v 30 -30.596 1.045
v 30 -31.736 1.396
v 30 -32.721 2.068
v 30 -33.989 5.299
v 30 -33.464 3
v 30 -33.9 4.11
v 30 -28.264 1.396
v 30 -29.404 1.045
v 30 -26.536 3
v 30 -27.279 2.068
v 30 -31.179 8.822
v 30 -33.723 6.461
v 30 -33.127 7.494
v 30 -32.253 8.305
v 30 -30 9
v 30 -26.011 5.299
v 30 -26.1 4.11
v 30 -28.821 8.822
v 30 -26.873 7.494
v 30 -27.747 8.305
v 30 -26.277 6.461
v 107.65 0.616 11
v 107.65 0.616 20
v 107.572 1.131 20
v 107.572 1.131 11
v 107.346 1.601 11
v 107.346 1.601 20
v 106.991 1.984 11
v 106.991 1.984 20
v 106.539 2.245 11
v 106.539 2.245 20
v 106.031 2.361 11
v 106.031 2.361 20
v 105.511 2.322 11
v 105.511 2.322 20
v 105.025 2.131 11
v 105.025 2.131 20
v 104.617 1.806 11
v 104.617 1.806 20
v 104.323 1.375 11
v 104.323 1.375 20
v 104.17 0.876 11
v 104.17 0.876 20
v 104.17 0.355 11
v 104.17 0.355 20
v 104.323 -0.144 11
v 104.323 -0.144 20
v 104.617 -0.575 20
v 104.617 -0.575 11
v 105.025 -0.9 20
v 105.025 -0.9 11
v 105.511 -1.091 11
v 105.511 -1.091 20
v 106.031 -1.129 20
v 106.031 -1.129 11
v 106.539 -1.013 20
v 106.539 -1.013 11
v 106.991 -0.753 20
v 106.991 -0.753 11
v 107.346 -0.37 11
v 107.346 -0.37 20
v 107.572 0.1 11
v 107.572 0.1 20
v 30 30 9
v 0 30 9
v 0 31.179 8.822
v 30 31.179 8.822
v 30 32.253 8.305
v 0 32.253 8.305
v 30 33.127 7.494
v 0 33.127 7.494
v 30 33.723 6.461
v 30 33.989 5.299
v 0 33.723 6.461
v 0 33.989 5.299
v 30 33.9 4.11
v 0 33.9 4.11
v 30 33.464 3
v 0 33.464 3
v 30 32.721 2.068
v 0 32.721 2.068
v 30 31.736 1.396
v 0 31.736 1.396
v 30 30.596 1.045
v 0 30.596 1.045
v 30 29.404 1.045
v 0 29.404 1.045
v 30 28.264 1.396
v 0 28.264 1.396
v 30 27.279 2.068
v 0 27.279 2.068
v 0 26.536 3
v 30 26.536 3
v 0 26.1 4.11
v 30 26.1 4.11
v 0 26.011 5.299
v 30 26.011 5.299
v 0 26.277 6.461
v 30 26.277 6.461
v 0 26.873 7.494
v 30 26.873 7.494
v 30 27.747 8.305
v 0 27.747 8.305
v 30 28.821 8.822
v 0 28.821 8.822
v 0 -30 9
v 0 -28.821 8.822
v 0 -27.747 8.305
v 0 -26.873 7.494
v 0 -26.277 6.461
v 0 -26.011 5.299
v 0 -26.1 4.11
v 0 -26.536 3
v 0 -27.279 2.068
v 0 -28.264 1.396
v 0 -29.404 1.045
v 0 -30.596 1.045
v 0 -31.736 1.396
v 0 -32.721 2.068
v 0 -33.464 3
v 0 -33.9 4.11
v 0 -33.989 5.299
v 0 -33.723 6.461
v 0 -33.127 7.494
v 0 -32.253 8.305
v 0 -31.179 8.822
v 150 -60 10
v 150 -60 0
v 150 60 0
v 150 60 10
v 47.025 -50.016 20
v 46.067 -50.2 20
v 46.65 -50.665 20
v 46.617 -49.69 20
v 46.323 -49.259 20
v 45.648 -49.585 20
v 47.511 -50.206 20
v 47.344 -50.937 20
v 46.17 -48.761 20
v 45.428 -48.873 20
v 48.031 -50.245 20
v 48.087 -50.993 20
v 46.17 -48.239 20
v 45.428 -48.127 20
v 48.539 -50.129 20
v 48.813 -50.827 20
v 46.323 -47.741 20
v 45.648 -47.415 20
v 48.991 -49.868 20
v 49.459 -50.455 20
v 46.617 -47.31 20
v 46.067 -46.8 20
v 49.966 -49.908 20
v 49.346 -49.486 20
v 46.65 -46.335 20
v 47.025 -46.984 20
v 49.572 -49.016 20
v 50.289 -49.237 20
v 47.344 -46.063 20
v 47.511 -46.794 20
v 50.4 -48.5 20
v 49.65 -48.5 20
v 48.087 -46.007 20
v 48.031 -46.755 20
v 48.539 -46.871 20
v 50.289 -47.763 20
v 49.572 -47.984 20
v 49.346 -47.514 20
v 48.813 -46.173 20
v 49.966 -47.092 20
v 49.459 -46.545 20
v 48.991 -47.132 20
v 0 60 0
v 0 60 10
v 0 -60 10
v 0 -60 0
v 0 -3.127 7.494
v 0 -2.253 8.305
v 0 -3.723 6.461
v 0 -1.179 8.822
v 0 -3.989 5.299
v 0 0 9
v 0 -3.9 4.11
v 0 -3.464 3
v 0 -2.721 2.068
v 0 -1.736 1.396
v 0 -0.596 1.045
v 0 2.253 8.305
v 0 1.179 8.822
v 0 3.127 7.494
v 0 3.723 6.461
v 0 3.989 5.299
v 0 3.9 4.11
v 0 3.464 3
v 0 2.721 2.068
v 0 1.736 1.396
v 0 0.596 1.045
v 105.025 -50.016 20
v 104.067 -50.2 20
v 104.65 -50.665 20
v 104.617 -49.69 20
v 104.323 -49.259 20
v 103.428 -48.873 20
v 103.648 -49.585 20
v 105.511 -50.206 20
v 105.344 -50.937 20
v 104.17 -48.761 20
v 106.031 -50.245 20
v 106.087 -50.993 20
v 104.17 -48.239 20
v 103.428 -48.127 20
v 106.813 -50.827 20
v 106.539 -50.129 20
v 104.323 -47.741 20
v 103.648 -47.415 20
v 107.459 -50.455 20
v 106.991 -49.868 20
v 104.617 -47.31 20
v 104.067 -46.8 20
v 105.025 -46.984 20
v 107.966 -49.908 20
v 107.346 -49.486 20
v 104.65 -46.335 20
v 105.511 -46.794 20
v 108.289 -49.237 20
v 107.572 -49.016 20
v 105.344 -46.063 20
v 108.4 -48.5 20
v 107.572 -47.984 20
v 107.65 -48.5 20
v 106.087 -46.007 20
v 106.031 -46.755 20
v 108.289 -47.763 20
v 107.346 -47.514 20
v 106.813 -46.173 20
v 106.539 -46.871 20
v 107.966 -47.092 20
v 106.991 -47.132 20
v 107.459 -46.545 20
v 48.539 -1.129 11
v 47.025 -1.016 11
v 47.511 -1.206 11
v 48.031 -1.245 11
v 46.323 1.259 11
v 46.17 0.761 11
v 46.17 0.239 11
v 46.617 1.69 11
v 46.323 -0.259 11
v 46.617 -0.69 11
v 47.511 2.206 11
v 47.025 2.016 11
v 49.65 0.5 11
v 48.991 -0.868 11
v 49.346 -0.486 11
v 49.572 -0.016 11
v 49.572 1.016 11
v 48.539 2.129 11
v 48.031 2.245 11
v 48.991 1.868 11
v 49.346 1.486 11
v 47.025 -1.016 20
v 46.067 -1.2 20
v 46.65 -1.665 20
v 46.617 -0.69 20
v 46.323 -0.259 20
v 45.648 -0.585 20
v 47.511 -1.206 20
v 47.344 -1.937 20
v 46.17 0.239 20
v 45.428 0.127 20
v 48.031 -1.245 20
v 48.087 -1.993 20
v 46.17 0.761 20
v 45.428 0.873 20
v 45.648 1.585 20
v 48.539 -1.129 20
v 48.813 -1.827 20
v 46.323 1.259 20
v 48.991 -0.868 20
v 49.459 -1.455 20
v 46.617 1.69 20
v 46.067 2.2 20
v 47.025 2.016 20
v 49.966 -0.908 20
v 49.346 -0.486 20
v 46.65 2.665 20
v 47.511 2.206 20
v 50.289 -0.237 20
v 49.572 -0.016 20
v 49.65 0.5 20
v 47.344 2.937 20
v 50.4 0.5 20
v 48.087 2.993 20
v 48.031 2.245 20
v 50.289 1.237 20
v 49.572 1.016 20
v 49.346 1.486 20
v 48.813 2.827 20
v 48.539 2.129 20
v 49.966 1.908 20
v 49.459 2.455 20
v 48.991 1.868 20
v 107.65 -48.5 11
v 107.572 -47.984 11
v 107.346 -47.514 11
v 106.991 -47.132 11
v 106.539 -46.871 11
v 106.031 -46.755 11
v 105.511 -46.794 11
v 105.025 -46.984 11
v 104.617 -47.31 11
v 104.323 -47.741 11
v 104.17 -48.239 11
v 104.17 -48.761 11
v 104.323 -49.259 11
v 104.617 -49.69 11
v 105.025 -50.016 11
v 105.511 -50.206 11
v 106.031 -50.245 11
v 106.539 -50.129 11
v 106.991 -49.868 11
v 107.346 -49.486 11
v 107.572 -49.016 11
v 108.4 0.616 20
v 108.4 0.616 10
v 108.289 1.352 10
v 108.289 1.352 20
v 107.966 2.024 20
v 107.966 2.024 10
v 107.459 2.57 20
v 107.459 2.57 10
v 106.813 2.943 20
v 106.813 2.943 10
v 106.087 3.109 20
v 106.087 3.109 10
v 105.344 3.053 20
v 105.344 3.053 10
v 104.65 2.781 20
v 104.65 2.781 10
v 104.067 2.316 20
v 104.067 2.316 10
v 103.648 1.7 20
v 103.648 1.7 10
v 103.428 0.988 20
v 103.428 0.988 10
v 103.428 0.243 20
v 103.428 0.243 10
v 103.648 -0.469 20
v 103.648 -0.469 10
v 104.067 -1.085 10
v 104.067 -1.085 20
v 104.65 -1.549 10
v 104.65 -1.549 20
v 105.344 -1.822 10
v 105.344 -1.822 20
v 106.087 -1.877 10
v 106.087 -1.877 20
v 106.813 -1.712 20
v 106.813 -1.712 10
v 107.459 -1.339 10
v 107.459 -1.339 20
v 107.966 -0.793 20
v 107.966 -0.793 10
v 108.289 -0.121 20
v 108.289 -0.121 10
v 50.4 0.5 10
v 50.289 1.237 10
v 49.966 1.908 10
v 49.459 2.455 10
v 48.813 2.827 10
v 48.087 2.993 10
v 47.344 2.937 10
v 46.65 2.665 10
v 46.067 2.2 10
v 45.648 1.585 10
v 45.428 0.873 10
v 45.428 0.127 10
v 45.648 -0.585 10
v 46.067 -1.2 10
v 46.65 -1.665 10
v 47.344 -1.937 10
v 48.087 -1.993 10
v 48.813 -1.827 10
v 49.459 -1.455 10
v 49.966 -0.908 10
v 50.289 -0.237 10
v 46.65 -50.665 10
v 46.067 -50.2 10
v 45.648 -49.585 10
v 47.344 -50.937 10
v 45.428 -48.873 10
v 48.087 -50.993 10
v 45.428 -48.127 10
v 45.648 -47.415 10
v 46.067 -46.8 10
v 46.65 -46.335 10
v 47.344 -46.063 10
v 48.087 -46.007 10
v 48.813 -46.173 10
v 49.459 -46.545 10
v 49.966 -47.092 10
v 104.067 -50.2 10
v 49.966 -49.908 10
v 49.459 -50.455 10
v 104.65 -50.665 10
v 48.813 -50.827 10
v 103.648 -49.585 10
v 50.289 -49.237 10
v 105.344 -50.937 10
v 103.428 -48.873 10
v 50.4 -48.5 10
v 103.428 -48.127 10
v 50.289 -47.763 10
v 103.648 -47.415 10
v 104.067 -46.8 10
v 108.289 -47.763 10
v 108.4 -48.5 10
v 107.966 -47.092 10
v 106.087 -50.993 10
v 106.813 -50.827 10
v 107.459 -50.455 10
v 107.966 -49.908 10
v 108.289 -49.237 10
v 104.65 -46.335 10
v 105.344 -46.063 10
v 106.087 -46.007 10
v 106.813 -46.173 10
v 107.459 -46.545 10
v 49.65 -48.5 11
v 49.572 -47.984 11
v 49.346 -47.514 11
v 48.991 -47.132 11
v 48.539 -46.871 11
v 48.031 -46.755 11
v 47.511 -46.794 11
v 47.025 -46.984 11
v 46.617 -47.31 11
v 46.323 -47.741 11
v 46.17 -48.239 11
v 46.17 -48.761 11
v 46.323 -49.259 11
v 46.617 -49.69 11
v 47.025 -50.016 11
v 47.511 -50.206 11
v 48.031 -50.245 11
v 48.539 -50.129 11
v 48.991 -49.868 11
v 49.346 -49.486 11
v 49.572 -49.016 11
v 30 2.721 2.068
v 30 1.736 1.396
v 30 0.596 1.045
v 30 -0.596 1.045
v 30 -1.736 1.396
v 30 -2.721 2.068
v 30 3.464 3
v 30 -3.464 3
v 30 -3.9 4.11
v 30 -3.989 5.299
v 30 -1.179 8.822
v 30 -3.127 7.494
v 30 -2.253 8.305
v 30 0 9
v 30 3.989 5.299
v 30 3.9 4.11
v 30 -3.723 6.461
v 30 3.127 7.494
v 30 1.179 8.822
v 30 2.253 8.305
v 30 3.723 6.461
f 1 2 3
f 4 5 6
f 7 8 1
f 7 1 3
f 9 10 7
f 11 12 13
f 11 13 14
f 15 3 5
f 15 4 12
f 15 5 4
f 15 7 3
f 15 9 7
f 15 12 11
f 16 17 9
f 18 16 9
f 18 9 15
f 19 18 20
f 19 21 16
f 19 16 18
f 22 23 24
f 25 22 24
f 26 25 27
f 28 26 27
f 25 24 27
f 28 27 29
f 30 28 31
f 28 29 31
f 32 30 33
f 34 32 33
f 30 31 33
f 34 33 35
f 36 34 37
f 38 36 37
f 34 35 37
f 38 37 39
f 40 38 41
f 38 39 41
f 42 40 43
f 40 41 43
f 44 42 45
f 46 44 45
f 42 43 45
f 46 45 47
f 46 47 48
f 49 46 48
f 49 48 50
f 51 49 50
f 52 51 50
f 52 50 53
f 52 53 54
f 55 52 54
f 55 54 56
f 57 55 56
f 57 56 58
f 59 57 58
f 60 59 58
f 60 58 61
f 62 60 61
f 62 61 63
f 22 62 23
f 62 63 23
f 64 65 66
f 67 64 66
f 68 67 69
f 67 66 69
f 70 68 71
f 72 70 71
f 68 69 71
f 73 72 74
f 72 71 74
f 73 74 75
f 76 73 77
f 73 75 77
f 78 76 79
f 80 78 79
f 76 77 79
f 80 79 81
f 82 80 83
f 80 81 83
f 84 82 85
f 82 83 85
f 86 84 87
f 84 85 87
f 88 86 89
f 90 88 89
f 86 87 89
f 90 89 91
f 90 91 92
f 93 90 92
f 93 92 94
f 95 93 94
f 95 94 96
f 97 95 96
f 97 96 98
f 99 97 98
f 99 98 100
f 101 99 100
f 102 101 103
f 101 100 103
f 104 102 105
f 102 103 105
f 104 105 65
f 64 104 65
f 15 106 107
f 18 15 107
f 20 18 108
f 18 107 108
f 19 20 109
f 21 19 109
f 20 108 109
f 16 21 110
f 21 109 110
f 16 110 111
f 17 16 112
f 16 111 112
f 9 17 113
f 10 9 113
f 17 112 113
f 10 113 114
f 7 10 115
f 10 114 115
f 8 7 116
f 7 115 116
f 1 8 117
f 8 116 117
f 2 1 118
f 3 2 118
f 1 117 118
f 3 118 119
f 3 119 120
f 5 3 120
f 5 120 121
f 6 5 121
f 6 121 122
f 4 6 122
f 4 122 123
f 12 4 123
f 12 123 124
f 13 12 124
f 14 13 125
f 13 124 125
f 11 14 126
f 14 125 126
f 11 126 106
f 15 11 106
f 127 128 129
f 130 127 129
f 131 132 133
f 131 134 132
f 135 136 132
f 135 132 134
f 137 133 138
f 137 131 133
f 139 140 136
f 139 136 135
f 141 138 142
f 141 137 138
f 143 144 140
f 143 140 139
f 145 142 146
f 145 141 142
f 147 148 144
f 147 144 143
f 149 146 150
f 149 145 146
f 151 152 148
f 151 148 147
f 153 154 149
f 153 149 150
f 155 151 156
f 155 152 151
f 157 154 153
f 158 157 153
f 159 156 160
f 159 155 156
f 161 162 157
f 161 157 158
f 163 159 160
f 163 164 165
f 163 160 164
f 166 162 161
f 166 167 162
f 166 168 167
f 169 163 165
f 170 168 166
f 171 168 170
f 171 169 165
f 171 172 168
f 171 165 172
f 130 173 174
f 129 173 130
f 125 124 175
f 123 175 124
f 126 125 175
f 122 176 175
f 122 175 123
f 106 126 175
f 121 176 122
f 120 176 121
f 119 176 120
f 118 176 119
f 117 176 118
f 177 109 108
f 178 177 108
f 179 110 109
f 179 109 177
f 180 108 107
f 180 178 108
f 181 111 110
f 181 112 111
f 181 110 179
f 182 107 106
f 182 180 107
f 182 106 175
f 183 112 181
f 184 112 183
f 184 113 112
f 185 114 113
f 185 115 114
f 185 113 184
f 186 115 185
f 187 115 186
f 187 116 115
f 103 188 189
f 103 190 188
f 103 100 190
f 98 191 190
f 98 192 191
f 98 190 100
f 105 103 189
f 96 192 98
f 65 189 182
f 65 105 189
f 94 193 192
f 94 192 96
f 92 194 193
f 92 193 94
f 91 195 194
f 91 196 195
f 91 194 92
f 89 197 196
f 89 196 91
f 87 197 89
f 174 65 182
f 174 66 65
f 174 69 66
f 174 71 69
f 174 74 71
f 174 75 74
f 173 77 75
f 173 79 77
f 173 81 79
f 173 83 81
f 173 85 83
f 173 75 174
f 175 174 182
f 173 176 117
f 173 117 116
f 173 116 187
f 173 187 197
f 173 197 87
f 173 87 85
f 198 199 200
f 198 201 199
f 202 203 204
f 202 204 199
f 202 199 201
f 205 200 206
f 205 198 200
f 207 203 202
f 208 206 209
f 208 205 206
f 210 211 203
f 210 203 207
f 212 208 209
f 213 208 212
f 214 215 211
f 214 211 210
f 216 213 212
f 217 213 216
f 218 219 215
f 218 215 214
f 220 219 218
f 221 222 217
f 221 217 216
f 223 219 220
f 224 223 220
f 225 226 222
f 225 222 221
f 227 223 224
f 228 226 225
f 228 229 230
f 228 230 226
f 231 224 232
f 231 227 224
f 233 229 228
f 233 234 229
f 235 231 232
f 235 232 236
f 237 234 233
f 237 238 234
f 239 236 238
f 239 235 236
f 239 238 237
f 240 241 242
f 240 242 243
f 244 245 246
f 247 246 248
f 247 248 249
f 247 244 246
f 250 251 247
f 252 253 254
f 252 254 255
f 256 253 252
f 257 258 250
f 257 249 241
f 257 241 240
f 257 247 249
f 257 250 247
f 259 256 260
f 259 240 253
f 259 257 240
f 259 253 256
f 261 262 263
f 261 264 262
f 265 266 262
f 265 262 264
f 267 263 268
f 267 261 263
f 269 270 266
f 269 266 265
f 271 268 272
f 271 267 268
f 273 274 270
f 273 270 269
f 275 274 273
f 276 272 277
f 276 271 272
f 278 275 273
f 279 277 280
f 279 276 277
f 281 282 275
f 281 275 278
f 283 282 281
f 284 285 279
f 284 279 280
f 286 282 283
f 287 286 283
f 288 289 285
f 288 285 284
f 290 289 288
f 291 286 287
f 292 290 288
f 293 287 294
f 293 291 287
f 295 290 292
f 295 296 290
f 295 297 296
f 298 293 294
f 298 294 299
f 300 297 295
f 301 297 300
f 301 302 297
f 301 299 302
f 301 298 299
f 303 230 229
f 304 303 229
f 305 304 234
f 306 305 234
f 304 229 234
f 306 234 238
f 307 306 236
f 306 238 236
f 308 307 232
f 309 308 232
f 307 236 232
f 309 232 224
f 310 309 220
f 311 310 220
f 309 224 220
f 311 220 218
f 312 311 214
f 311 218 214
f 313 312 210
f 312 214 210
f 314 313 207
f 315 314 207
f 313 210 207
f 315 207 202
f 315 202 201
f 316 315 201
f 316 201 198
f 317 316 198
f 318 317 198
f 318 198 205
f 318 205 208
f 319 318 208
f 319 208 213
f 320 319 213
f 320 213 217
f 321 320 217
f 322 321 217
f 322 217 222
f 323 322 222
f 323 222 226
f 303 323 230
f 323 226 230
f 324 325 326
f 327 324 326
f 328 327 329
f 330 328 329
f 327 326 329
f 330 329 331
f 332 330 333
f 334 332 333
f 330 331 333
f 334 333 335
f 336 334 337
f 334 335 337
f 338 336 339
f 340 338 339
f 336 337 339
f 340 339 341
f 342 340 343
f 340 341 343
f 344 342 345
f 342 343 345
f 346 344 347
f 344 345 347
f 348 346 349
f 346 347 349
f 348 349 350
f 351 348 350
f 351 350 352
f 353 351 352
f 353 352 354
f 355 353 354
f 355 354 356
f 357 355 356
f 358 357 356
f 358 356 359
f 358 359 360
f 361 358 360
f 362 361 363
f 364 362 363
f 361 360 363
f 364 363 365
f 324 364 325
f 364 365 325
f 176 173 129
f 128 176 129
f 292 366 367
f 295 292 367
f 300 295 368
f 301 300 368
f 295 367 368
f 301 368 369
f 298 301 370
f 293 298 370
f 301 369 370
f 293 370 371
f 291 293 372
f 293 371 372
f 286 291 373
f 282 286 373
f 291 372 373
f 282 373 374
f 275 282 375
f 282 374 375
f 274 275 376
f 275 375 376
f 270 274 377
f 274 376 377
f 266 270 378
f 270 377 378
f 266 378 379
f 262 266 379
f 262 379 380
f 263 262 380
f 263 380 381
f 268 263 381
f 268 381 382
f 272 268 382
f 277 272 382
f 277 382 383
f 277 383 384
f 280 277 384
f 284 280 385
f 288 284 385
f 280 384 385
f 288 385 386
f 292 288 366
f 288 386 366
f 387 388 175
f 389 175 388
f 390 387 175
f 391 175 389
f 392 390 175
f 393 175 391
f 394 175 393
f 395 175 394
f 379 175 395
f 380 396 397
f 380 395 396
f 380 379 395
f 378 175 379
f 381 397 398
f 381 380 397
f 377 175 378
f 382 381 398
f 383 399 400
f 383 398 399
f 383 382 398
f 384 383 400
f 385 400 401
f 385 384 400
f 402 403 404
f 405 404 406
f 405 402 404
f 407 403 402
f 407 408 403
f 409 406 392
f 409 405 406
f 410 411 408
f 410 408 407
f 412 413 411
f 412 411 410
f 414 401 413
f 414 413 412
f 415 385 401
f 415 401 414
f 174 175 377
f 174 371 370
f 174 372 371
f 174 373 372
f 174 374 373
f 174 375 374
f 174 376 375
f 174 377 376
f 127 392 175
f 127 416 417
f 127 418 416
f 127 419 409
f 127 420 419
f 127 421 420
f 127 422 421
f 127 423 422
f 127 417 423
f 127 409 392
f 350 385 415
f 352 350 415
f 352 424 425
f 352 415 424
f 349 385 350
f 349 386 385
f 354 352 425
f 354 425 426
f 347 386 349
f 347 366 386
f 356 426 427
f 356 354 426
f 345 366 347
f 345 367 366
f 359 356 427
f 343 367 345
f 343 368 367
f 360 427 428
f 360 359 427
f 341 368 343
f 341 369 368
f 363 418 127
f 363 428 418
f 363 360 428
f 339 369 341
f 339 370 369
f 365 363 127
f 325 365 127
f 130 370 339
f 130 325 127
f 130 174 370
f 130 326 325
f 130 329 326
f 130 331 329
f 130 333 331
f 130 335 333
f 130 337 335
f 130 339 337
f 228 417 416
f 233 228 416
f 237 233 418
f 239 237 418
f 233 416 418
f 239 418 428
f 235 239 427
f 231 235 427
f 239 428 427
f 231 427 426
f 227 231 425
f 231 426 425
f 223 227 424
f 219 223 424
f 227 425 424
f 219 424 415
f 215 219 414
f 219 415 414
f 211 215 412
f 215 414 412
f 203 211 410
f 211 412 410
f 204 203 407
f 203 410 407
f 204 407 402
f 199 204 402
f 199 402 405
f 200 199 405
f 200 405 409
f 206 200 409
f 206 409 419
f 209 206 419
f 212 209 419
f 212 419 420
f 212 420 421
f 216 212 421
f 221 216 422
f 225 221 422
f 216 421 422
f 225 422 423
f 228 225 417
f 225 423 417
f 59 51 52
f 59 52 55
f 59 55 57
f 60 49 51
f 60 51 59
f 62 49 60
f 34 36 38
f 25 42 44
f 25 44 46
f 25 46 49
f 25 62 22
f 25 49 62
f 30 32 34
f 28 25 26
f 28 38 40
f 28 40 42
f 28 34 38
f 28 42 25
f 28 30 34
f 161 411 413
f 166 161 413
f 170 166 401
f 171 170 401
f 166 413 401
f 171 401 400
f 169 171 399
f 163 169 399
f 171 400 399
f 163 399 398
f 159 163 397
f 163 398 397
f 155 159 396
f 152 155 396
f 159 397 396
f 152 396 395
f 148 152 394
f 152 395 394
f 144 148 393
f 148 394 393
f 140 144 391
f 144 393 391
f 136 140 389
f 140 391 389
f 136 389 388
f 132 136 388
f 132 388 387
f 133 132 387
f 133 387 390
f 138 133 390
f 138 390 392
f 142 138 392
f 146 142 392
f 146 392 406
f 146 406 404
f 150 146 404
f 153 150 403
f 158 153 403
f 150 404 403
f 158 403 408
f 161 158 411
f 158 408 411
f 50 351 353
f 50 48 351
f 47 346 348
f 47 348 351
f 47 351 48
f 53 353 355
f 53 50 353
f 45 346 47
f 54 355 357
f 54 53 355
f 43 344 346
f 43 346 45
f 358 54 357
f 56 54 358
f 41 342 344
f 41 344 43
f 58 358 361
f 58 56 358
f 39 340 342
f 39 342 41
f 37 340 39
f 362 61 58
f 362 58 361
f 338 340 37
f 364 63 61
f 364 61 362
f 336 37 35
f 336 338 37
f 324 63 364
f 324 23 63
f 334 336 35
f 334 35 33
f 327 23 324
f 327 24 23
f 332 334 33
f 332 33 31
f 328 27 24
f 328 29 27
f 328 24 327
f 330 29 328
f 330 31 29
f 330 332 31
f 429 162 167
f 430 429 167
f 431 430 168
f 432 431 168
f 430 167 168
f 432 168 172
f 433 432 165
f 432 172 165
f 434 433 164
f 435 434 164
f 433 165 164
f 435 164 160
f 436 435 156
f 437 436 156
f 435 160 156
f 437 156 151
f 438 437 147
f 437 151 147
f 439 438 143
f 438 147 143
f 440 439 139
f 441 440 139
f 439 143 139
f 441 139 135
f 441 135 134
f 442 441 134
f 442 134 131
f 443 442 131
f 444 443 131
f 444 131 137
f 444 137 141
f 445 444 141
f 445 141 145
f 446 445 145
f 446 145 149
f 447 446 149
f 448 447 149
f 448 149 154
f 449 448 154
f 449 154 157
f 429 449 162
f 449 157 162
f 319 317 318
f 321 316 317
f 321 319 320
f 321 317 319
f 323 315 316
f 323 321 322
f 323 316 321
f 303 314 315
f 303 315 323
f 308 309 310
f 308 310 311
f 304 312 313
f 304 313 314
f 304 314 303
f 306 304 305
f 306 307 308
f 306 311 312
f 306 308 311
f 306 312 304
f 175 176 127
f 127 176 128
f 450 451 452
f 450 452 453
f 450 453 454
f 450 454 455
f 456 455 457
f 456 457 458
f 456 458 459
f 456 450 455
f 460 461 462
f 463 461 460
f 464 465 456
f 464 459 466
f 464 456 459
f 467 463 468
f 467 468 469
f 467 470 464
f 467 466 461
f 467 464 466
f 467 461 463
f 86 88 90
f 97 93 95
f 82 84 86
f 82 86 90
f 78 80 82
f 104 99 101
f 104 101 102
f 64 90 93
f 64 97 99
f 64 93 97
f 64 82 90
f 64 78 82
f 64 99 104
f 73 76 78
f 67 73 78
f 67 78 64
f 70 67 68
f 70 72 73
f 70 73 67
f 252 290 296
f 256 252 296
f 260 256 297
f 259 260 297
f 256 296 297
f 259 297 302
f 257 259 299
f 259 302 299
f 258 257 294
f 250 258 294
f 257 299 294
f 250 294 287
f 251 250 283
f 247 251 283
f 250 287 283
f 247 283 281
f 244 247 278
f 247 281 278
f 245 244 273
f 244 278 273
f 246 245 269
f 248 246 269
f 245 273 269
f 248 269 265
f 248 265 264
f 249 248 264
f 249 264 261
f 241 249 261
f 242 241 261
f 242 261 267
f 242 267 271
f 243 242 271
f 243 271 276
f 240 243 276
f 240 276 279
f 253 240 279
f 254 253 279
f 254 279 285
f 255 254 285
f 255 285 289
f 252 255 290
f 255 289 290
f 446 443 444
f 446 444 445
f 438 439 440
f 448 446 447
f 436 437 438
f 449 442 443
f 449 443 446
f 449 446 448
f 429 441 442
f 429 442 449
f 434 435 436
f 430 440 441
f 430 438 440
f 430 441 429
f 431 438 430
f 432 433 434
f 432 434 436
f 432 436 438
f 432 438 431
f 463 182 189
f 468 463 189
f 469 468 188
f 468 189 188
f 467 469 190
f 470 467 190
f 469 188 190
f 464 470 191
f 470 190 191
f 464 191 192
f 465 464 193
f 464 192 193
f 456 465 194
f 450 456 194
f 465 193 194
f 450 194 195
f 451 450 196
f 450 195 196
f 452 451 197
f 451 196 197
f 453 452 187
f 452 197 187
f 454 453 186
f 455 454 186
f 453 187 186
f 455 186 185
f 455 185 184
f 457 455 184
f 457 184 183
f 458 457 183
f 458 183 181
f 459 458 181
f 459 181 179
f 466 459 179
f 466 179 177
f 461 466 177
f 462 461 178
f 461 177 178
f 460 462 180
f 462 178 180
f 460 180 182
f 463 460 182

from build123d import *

# Parameters (mm, degrees)
SKETCH1_W               = 150
SKETCH1_H               = 120
BOSS_EXTRUDE1_DEPTH     = 10
SKETCH2_R               = 4
CUT_EXTRUDE1_DEPTH      = 30
CROQUIS4_R              = 2.5
SALIENTE_EXTRUIR2_DEPTH = 10
CROQUIS5_R              = 1.75
CORTAR_EXTRUIR1_DEPTH   = 9


with BuildPart() as part:
    # Sketch1 → Boss-Extrude1 (new body)
    with BuildSketch(Plane.XY):
        with Locations((75, 0)):
            Rectangle(SKETCH1_W, SKETCH1_H)
    extrude(amount=BOSS_EXTRUDE1_DEPTH)

    # Sketch2 → Cut-Extrude1 (cut)
    with BuildSketch(Plane.ZY):
        with Locations((5, 0)):
            Circle(SKETCH2_R)
        with Locations((5, 30)):
            Circle(SKETCH2_R)
        with Locations((5, -30)):
            Circle(SKETCH2_R)
    extrude(amount=-CUT_EXTRUDE1_DEPTH, mode=Mode.SUBTRACT)

    # Croquis4 → Saliente-Extruir2 (add)
    with BuildSketch(Plane.XY.offset(10)):
        with Locations((47.900115216, 0.5)):
            Circle(CROQUIS4_R)
        with Locations((105.9, 0.615607451)):
            Circle(CROQUIS4_R)
        with Locations((105.9, -48.5)):
            Circle(CROQUIS4_R)
        with Locations((47.900115216, -48.5)):
            Circle(CROQUIS4_R)
    extrude(amount=SALIENTE_EXTRUIR2_DEPTH)

    # Croquis5 → Cortar-Extruir1 (cut)
    with BuildSketch(Plane.XY.offset(20)):
        with Locations((47.900115216, 0.5)):
            Circle(CROQUIS5_R)
        with Locations((47.900115216, -48.5)):
            Circle(CROQUIS5_R)
        with Locations((105.9, -48.5)):
            Circle(CROQUIS5_R)
        with Locations((105.9, 0.615607451)):
            Circle(CROQUIS5_R)
    extrude(amount=-CORTAR_EXTRUIR1_DEPTH, mode=Mode.SUBTRACT)


solid = part.part
